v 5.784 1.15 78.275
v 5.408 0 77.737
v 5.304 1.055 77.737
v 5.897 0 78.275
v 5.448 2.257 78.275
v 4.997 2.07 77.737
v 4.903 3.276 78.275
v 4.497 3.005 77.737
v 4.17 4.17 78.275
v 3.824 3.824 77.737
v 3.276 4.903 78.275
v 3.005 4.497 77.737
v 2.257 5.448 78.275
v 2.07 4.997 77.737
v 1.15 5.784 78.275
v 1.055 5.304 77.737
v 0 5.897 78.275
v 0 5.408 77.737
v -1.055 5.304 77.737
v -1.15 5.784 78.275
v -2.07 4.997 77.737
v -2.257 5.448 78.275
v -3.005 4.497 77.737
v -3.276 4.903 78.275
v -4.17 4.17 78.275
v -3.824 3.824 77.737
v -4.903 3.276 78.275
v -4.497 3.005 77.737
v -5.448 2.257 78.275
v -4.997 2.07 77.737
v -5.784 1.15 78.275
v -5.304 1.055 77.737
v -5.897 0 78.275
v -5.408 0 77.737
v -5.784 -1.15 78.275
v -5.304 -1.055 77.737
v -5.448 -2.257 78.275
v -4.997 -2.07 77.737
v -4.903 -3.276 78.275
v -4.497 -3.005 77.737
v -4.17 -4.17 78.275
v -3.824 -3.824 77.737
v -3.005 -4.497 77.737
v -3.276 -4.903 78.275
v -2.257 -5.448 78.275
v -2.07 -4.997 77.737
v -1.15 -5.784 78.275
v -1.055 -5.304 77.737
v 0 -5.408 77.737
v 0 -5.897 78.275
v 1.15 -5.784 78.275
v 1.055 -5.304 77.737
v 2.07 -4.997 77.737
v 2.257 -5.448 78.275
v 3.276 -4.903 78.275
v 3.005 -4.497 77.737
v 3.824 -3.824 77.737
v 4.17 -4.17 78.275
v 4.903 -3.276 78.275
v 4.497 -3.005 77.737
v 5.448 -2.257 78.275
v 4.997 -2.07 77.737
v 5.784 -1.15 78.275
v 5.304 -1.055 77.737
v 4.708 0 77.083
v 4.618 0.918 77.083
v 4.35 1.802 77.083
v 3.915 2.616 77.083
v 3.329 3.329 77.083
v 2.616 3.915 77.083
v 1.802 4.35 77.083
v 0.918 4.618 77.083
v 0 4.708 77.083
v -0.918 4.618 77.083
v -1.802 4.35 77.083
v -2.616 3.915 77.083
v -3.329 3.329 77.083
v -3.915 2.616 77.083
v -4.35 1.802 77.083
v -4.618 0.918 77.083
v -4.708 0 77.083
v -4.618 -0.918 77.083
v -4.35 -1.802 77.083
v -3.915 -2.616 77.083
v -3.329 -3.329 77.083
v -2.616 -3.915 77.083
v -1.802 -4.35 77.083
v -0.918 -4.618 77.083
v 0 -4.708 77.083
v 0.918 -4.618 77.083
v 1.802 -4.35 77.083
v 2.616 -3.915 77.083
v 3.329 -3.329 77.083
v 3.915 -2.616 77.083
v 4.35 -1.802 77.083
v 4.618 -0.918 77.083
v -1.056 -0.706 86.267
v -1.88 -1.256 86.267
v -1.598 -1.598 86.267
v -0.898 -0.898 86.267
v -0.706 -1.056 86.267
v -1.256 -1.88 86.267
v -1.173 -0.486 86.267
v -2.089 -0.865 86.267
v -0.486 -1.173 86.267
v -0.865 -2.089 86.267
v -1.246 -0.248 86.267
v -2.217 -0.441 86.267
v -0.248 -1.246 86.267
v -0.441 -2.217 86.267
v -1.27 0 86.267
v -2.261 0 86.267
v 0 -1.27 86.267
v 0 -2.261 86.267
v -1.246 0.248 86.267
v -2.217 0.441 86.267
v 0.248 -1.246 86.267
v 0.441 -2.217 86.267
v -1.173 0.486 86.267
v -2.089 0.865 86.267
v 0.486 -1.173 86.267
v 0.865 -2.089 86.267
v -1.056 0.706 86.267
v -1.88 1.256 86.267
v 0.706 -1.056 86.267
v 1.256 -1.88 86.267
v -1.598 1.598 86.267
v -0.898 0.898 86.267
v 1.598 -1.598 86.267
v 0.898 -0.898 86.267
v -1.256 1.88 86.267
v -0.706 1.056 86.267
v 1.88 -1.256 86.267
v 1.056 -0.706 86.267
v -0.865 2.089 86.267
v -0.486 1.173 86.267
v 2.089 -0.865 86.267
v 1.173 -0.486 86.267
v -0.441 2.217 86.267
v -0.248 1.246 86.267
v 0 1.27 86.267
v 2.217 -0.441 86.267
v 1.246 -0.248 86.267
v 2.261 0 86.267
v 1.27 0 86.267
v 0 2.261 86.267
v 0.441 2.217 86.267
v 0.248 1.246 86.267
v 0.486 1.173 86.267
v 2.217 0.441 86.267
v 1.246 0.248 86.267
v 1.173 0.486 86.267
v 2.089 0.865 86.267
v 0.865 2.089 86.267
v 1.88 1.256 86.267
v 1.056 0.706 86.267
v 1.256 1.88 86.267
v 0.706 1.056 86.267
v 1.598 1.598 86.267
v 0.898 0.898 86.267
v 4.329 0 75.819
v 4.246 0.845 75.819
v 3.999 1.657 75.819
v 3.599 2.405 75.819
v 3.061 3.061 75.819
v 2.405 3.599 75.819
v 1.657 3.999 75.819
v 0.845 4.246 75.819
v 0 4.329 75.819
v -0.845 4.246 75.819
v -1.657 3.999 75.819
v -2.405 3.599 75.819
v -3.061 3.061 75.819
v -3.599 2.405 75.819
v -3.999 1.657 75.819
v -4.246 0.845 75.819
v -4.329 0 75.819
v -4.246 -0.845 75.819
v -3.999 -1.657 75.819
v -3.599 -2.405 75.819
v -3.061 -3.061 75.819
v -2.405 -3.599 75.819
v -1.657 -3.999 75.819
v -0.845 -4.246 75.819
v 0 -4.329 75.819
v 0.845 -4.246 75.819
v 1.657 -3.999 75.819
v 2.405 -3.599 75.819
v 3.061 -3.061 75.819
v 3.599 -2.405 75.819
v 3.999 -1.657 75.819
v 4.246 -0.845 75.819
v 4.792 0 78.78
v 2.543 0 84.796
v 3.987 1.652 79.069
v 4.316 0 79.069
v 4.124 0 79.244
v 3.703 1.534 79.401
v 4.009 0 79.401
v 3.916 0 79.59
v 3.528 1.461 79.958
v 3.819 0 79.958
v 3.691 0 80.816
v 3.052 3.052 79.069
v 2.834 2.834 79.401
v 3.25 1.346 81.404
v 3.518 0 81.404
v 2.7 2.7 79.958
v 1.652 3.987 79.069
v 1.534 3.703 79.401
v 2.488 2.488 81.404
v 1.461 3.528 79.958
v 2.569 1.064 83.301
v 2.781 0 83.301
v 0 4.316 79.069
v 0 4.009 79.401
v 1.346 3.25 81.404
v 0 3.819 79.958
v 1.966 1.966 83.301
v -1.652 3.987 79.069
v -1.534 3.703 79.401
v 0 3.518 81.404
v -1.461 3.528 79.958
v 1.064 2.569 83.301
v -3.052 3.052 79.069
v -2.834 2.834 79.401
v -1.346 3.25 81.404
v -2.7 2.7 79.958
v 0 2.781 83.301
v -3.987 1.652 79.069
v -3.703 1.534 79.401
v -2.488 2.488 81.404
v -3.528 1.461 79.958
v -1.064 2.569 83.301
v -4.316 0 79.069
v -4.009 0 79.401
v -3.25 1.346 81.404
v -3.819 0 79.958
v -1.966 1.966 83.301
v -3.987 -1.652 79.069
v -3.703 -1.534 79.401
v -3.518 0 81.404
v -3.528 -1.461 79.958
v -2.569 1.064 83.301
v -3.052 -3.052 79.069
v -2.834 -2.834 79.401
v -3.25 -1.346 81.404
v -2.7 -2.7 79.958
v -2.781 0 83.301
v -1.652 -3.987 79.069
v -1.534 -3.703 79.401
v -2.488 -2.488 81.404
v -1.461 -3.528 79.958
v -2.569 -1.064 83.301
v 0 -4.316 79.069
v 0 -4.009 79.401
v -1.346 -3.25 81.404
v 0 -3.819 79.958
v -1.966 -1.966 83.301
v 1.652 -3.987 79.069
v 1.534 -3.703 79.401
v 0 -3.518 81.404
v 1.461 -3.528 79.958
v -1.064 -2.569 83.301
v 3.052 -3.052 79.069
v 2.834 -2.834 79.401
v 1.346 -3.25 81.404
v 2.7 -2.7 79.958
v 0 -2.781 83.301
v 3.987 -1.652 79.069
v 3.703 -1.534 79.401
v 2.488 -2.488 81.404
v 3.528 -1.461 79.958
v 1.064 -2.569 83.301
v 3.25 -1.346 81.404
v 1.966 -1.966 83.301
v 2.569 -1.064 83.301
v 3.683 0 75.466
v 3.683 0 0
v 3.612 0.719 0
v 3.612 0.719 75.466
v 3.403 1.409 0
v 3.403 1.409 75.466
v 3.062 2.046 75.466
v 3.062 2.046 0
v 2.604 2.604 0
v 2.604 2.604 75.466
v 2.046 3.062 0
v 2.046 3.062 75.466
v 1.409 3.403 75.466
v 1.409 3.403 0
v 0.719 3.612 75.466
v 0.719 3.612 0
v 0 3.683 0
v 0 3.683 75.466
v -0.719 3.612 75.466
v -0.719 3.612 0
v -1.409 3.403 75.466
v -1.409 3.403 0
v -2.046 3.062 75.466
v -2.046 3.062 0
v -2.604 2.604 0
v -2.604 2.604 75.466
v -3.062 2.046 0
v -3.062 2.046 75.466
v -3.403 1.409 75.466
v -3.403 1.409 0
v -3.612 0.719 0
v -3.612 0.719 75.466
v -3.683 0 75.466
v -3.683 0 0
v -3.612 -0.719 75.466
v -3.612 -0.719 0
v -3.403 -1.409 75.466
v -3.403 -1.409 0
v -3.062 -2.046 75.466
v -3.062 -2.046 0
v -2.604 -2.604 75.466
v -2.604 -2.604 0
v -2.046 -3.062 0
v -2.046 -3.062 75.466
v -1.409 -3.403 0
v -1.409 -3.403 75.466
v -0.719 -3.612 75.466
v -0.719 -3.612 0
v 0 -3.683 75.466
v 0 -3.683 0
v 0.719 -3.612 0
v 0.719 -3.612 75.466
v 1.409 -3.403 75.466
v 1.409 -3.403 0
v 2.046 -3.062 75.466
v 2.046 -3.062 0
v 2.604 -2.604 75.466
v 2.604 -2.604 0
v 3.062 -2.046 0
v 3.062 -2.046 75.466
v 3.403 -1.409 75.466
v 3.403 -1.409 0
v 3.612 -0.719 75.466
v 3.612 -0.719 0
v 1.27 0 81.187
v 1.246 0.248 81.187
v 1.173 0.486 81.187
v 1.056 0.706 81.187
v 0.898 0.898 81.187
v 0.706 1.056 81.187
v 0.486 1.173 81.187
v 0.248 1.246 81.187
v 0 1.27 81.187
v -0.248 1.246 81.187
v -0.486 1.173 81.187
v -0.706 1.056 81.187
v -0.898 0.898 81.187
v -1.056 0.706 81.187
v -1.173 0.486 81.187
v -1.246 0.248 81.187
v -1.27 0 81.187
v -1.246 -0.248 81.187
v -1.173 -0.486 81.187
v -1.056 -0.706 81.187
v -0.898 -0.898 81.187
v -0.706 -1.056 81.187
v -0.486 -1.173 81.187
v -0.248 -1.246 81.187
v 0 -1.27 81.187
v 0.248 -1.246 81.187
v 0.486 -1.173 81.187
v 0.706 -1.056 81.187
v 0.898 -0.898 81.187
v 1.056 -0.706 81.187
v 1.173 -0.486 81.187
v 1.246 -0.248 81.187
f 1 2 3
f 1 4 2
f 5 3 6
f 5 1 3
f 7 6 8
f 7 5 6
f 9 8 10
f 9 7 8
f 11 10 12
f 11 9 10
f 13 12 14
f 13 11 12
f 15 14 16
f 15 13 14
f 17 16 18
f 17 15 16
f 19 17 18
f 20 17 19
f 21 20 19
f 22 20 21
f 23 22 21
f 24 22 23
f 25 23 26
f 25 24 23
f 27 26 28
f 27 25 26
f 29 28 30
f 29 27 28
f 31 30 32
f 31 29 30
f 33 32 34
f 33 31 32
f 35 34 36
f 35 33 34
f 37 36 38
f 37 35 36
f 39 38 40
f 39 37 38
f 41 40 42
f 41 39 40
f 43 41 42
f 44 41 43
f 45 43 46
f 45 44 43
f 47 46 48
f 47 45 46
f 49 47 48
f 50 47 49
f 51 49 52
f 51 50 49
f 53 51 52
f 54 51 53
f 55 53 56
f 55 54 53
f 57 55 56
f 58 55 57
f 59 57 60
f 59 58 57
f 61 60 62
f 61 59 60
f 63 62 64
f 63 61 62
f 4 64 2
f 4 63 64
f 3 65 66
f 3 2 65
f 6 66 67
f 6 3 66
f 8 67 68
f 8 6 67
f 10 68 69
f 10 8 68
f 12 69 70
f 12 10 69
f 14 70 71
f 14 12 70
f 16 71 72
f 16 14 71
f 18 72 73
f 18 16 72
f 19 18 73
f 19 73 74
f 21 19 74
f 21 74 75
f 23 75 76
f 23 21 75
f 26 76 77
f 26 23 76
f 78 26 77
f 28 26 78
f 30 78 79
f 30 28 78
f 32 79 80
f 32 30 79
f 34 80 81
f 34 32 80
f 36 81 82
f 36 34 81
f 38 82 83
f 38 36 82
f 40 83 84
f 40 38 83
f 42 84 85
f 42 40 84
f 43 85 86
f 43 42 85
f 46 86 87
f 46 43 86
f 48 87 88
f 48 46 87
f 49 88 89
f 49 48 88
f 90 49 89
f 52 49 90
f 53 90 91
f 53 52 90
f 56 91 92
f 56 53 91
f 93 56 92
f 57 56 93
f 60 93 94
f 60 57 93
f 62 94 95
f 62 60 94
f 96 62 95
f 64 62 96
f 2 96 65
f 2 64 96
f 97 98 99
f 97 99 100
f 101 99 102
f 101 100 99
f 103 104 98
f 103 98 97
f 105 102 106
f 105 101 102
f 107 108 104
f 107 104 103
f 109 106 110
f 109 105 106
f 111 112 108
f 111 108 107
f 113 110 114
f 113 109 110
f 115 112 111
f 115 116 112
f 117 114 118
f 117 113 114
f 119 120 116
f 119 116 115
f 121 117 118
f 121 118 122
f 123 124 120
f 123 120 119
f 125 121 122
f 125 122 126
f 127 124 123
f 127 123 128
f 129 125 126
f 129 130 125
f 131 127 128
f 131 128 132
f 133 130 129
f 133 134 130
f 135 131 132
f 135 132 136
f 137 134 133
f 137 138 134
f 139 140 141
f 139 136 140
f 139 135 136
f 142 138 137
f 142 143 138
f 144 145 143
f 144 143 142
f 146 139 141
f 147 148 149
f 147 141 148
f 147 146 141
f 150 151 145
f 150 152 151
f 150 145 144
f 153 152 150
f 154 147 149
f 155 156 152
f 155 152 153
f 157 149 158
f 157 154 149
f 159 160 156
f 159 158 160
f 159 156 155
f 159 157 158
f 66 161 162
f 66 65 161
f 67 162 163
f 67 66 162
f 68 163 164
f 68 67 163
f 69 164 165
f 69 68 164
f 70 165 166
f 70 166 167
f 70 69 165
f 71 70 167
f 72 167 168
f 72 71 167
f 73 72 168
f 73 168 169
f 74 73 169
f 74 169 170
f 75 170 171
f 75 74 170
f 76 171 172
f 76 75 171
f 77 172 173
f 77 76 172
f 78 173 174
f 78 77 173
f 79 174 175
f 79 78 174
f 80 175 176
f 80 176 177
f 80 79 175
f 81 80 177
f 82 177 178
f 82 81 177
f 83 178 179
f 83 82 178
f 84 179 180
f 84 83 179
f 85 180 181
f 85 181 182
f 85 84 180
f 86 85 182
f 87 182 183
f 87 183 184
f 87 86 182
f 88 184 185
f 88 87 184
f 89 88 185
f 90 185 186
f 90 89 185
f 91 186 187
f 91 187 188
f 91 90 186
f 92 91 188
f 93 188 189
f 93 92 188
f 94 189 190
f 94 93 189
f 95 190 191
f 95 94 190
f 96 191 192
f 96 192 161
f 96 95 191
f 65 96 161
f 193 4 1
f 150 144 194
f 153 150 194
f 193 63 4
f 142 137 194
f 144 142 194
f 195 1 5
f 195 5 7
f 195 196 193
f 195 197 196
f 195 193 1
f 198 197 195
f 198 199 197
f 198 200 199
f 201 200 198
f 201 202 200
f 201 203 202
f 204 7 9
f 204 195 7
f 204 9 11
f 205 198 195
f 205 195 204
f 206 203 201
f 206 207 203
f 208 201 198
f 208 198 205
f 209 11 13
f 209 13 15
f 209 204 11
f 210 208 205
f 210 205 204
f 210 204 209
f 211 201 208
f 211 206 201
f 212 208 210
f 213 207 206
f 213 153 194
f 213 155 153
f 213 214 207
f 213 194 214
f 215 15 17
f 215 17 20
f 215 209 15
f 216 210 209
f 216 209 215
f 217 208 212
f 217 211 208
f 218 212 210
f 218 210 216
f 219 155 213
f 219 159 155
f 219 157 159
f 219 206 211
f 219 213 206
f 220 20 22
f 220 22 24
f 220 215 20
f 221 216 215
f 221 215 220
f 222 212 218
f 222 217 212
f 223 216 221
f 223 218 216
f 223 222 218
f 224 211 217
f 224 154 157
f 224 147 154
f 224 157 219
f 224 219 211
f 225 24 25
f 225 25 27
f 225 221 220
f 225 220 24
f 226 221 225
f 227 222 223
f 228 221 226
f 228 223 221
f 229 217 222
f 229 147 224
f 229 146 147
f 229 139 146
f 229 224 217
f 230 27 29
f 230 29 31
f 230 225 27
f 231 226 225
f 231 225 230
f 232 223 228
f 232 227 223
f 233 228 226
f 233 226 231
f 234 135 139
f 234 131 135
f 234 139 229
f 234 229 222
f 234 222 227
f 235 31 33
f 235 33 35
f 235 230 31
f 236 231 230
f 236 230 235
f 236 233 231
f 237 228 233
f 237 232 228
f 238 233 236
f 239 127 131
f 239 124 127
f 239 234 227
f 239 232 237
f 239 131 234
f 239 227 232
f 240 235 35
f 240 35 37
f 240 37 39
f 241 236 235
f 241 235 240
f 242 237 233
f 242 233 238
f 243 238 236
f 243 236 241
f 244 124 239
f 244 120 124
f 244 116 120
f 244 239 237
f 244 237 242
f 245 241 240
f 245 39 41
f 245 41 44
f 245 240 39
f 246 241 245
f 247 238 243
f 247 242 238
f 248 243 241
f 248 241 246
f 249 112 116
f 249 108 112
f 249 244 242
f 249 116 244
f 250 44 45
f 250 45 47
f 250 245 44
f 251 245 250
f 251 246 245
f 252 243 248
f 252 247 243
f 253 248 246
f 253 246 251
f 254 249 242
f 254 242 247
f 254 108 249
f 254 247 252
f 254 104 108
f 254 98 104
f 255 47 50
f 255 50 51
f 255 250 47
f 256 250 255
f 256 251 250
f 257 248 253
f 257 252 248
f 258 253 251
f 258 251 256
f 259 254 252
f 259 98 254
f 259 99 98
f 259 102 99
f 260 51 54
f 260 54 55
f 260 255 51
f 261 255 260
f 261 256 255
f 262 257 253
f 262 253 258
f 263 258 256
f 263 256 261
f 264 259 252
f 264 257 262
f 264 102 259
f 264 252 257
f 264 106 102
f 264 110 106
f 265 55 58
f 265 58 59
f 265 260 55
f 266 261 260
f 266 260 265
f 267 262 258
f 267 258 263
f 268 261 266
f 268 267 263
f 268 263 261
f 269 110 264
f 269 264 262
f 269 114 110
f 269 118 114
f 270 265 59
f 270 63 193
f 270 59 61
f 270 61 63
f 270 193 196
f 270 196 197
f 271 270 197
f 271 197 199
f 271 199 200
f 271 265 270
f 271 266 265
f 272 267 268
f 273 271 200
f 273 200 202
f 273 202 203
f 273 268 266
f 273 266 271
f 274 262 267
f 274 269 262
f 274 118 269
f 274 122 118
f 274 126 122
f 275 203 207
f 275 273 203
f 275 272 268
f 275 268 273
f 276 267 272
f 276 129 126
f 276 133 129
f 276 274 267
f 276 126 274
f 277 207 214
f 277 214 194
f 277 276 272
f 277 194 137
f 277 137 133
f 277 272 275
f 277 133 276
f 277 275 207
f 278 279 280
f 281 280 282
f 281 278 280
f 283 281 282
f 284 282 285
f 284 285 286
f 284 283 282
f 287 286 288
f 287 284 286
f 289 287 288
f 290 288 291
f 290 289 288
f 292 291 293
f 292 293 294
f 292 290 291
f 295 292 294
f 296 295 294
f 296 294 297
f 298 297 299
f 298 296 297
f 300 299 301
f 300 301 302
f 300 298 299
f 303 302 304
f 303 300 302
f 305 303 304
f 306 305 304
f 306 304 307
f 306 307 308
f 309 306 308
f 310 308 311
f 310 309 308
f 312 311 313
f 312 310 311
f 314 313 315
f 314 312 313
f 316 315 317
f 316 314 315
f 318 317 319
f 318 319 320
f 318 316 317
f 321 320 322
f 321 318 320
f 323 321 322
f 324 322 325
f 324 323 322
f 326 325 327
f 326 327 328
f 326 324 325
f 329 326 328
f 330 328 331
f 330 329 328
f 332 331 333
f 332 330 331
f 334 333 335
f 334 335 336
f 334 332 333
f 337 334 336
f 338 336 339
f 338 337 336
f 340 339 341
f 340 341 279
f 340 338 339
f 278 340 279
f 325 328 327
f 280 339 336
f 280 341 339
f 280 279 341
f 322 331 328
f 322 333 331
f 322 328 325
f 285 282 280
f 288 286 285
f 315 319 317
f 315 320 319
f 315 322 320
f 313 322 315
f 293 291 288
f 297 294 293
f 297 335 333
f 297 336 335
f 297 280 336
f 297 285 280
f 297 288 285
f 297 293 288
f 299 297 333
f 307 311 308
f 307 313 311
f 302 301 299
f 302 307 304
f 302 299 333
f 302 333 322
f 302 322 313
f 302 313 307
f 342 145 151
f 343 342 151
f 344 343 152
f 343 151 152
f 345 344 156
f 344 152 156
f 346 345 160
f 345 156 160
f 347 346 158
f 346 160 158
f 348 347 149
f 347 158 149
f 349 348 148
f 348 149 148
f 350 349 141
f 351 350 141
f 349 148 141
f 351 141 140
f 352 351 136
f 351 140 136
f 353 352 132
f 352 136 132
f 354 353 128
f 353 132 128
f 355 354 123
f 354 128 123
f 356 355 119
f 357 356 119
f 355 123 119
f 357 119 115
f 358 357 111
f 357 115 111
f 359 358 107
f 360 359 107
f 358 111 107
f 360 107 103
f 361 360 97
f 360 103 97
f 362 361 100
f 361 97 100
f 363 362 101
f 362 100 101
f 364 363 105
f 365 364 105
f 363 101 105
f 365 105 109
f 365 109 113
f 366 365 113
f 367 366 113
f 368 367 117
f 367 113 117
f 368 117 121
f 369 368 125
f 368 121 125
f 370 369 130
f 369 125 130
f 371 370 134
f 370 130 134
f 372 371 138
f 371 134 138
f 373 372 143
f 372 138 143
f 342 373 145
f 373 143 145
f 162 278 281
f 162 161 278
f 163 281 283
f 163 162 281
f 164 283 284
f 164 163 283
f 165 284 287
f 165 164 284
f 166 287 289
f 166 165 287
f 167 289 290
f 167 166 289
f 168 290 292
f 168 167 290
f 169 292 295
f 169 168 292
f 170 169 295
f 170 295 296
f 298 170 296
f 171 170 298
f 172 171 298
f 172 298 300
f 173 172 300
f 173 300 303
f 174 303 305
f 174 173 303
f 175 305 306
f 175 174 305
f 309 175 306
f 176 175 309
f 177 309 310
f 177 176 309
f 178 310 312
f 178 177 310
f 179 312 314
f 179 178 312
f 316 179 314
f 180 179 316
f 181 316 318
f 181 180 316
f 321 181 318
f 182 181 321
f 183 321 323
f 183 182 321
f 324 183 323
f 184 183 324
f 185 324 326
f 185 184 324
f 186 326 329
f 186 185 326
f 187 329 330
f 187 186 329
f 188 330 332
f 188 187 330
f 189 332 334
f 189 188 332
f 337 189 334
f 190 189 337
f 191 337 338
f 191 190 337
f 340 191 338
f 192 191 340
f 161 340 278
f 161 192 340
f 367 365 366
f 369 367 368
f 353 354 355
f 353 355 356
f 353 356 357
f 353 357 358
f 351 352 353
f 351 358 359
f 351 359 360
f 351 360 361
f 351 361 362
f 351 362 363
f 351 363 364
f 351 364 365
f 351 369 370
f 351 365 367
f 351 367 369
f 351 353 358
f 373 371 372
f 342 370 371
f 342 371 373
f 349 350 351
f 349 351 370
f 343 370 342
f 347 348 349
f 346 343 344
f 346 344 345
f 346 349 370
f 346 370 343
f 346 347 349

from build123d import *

# Parameters (mm, degrees)
F2_R     = 1.27
F3_DEPTH = 5.08


# Not quite as in the source:
# - a feature names something its author has since deleted; it is built from what else it names


with BuildPart() as f1:
    # F0 (on Front) → F1 (revolve)
    with BuildSketch(Plane.XZ):
        with BuildLine():
            Line((0, 76.2), (0, 0))
            Line((0, 0), (3.683, 0))
            Line((3.683, 0), (3.683, 50.5892820656))
            Line((3.683, 50.5892820656), (3.683, 75.4657239321))
            add(Edge.make_bspline(
                [(3.683, 75.4657239321), (3.9001026563, 75.5844257372), (4.117282526, 75.702956664), (4.3289103642, 75.8188781839)],
                knots=[0, 0, 0, 0, 0.0367930761, 0.0367930761, 0.0367930761, 0.0367930761], degree=3))
            Line((4.3289103642, 75.8188781839), (4.7080438681, 77.083454169))
            Line((4.7080438681, 77.083454169), (5.4083663136, 77.7371979129))
            Line((5.4083663136, 77.7371979129), (5.8970035864, 78.2753947108))
            add(Edge.make_bspline(
                [(5.8970035864, 78.2753947108), (5.4557518487, 78.5243036944), (3.6824791799, 79.0277734306), (3.8959075155, 80.928711884), (2.7015379677, 83.0135115397), (2.599091359, 84.685822435), (2.3724716532, 85.744447935), (2.2606033154, 86.2670275395)],
                knots=[0.4795528936, 0.4795528936, 0.4795528936, 0.4795528936, 0.5884154591, 0.6871467774, 0.8044356188, 0.9034623818, 1, 1, 1, 1], degree=3))
            Line((2.2606033154, 86.2670275395), (0, 86.2670275395))
            Line((0, 86.2670275395), (0, 85.744447935))
            Line((0, 85.744447935), (0, 76.2))
        make_face()
    revolve(axis=Axis((0, 0, 38.1), (0, 0, 1)))

    # F2 (on face) → F3 (cut)
    with BuildSketch(Plane.XY.offset(86.2670275395)):
        Circle(F2_R)
    extrude(amount=-F3_DEPTH, mode=Mode.SUBTRACT)


solid = f1.part
